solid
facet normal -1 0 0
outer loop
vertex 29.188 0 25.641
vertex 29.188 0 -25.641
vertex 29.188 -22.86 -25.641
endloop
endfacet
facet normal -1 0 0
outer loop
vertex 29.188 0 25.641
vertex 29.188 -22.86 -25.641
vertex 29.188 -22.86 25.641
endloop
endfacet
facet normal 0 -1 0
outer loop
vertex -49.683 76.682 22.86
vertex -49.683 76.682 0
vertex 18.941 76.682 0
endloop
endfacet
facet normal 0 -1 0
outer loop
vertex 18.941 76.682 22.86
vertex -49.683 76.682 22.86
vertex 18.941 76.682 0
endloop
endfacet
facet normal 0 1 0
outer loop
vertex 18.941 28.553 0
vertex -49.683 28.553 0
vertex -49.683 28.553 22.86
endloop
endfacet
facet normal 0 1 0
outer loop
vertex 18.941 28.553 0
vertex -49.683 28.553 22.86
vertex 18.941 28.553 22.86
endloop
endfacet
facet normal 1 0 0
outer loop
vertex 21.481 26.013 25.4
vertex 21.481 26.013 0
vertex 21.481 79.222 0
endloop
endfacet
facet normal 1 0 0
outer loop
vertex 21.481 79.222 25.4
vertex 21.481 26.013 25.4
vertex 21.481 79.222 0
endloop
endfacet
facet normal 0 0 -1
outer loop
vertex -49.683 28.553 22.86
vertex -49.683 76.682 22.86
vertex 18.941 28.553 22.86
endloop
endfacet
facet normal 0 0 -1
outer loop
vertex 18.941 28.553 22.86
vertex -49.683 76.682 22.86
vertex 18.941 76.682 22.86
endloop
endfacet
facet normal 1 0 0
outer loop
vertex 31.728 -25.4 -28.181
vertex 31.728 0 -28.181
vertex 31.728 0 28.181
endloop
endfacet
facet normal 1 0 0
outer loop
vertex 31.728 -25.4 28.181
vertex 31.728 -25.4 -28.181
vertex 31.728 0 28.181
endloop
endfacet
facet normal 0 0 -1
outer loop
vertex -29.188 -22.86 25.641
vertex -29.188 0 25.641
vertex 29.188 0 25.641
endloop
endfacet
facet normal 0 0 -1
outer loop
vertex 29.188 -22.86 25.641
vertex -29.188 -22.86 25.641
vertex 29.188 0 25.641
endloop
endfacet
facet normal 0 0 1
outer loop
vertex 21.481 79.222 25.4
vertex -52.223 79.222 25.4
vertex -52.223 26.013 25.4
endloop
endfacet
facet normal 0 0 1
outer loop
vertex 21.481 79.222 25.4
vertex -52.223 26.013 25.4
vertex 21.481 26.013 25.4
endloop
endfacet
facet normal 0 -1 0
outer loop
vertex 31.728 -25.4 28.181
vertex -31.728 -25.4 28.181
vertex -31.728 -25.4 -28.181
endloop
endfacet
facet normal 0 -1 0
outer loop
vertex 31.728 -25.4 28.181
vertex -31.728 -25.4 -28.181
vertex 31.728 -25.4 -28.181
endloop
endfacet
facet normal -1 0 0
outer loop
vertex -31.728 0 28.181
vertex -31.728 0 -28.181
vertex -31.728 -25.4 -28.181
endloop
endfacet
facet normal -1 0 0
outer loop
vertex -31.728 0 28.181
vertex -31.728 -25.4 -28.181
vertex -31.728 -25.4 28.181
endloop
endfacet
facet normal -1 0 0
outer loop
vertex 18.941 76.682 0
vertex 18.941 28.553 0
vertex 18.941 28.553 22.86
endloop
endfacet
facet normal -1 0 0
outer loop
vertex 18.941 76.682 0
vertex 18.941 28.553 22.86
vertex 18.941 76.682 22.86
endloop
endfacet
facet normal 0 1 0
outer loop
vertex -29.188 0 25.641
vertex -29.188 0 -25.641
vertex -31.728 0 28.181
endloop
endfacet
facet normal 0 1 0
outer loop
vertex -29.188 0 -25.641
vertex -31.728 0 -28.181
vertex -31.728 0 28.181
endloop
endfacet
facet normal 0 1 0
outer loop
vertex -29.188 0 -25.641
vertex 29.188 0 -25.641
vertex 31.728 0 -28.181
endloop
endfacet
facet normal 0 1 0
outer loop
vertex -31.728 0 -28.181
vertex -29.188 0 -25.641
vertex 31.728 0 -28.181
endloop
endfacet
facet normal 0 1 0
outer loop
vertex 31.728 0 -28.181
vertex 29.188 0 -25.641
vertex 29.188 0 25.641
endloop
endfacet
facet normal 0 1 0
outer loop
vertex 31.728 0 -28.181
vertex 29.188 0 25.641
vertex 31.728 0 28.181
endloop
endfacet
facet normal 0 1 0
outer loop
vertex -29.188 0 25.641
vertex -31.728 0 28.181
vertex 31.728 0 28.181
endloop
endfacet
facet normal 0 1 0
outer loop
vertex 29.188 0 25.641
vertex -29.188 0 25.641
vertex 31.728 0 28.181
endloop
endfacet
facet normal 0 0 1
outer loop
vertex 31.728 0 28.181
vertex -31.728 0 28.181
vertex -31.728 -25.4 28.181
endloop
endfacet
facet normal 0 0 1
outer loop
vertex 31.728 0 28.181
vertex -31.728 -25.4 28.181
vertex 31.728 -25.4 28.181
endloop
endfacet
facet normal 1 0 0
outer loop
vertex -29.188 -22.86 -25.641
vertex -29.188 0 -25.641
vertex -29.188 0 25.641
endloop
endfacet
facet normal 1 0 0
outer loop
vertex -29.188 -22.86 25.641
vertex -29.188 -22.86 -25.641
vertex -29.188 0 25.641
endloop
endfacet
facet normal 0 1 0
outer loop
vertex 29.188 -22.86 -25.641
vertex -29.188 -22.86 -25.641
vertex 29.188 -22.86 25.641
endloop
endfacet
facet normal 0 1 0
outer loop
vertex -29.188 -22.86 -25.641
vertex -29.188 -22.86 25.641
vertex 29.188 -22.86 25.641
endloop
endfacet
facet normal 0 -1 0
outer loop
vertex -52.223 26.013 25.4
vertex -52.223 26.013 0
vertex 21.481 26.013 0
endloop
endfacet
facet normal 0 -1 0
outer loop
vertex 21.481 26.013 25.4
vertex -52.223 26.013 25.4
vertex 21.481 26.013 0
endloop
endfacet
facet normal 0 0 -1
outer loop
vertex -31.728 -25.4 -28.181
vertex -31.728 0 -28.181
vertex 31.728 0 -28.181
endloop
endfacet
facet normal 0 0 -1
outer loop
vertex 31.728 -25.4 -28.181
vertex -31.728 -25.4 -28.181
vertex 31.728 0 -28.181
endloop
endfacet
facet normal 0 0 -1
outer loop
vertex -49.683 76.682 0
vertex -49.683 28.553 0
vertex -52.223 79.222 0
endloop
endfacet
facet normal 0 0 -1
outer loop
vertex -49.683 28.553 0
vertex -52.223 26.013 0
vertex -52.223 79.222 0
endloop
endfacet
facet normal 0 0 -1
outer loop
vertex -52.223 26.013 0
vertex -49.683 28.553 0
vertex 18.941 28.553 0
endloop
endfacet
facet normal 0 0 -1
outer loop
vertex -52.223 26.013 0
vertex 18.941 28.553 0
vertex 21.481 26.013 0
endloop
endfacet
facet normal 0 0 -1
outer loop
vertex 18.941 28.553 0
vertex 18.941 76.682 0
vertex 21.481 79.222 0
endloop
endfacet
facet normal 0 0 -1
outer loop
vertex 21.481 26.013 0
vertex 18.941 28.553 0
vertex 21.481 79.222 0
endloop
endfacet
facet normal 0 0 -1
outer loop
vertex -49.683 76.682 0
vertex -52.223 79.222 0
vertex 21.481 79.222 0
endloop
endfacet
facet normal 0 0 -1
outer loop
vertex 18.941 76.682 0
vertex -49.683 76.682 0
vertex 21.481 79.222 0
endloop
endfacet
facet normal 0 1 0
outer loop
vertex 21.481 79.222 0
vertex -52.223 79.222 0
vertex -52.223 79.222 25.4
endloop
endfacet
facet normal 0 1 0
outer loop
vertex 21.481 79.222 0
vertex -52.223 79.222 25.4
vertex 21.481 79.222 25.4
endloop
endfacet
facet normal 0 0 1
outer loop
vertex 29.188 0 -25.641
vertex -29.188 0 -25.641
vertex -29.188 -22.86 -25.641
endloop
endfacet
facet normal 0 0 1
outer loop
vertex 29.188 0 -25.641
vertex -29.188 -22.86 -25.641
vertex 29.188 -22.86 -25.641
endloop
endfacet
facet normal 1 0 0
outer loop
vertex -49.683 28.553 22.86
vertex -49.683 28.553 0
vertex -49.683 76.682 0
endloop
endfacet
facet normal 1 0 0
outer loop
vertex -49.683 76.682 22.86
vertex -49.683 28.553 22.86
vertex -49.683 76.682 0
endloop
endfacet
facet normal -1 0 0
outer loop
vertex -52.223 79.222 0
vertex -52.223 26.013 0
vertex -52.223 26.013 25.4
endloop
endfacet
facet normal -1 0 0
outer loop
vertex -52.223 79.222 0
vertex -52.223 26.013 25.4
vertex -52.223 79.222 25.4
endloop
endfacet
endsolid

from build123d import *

# Parameters (mm, degrees)
F0_W     = 63.456208
F0_H     = 56.361724
F1_DEPTH = 25.4
F2_W     = 73.703793
F2_H     = 53.208616
F3_DEPTH = 25.4
F4_T     = -2.54
F4_2_T   = -2.54


with BuildPart() as f1:
    # F0 (on Front) → F1 (new body)
    with BuildSketch(Plane.XZ):
        Rectangle(F0_W, F0_H)
    extrude(amount=F1_DEPTH)

    # F4#2
    f4_2_openings = [f1.faces().sort_by_distance(p)[0] for p in [
        (0, 0, 0),
    ]]
    offset(amount=F4_2_T, openings=f4_2_openings)


with BuildPart() as f3:
    # F2 (on Top) → F3 (new body)
    with BuildSketch(Plane.XY):
        with Locations((-15.371379, 52.617412)):
            Rectangle(F2_W, F2_H)
    extrude(amount=F3_DEPTH)

    # F4
    f4_openings = [f3.faces().sort_by_distance(p)[0] for p in [
        (-15.371379, 52.617412, 0),
    ]]
    offset(amount=F4_T, openings=f4_openings)


solid = Compound([f1.part, f3.part])
